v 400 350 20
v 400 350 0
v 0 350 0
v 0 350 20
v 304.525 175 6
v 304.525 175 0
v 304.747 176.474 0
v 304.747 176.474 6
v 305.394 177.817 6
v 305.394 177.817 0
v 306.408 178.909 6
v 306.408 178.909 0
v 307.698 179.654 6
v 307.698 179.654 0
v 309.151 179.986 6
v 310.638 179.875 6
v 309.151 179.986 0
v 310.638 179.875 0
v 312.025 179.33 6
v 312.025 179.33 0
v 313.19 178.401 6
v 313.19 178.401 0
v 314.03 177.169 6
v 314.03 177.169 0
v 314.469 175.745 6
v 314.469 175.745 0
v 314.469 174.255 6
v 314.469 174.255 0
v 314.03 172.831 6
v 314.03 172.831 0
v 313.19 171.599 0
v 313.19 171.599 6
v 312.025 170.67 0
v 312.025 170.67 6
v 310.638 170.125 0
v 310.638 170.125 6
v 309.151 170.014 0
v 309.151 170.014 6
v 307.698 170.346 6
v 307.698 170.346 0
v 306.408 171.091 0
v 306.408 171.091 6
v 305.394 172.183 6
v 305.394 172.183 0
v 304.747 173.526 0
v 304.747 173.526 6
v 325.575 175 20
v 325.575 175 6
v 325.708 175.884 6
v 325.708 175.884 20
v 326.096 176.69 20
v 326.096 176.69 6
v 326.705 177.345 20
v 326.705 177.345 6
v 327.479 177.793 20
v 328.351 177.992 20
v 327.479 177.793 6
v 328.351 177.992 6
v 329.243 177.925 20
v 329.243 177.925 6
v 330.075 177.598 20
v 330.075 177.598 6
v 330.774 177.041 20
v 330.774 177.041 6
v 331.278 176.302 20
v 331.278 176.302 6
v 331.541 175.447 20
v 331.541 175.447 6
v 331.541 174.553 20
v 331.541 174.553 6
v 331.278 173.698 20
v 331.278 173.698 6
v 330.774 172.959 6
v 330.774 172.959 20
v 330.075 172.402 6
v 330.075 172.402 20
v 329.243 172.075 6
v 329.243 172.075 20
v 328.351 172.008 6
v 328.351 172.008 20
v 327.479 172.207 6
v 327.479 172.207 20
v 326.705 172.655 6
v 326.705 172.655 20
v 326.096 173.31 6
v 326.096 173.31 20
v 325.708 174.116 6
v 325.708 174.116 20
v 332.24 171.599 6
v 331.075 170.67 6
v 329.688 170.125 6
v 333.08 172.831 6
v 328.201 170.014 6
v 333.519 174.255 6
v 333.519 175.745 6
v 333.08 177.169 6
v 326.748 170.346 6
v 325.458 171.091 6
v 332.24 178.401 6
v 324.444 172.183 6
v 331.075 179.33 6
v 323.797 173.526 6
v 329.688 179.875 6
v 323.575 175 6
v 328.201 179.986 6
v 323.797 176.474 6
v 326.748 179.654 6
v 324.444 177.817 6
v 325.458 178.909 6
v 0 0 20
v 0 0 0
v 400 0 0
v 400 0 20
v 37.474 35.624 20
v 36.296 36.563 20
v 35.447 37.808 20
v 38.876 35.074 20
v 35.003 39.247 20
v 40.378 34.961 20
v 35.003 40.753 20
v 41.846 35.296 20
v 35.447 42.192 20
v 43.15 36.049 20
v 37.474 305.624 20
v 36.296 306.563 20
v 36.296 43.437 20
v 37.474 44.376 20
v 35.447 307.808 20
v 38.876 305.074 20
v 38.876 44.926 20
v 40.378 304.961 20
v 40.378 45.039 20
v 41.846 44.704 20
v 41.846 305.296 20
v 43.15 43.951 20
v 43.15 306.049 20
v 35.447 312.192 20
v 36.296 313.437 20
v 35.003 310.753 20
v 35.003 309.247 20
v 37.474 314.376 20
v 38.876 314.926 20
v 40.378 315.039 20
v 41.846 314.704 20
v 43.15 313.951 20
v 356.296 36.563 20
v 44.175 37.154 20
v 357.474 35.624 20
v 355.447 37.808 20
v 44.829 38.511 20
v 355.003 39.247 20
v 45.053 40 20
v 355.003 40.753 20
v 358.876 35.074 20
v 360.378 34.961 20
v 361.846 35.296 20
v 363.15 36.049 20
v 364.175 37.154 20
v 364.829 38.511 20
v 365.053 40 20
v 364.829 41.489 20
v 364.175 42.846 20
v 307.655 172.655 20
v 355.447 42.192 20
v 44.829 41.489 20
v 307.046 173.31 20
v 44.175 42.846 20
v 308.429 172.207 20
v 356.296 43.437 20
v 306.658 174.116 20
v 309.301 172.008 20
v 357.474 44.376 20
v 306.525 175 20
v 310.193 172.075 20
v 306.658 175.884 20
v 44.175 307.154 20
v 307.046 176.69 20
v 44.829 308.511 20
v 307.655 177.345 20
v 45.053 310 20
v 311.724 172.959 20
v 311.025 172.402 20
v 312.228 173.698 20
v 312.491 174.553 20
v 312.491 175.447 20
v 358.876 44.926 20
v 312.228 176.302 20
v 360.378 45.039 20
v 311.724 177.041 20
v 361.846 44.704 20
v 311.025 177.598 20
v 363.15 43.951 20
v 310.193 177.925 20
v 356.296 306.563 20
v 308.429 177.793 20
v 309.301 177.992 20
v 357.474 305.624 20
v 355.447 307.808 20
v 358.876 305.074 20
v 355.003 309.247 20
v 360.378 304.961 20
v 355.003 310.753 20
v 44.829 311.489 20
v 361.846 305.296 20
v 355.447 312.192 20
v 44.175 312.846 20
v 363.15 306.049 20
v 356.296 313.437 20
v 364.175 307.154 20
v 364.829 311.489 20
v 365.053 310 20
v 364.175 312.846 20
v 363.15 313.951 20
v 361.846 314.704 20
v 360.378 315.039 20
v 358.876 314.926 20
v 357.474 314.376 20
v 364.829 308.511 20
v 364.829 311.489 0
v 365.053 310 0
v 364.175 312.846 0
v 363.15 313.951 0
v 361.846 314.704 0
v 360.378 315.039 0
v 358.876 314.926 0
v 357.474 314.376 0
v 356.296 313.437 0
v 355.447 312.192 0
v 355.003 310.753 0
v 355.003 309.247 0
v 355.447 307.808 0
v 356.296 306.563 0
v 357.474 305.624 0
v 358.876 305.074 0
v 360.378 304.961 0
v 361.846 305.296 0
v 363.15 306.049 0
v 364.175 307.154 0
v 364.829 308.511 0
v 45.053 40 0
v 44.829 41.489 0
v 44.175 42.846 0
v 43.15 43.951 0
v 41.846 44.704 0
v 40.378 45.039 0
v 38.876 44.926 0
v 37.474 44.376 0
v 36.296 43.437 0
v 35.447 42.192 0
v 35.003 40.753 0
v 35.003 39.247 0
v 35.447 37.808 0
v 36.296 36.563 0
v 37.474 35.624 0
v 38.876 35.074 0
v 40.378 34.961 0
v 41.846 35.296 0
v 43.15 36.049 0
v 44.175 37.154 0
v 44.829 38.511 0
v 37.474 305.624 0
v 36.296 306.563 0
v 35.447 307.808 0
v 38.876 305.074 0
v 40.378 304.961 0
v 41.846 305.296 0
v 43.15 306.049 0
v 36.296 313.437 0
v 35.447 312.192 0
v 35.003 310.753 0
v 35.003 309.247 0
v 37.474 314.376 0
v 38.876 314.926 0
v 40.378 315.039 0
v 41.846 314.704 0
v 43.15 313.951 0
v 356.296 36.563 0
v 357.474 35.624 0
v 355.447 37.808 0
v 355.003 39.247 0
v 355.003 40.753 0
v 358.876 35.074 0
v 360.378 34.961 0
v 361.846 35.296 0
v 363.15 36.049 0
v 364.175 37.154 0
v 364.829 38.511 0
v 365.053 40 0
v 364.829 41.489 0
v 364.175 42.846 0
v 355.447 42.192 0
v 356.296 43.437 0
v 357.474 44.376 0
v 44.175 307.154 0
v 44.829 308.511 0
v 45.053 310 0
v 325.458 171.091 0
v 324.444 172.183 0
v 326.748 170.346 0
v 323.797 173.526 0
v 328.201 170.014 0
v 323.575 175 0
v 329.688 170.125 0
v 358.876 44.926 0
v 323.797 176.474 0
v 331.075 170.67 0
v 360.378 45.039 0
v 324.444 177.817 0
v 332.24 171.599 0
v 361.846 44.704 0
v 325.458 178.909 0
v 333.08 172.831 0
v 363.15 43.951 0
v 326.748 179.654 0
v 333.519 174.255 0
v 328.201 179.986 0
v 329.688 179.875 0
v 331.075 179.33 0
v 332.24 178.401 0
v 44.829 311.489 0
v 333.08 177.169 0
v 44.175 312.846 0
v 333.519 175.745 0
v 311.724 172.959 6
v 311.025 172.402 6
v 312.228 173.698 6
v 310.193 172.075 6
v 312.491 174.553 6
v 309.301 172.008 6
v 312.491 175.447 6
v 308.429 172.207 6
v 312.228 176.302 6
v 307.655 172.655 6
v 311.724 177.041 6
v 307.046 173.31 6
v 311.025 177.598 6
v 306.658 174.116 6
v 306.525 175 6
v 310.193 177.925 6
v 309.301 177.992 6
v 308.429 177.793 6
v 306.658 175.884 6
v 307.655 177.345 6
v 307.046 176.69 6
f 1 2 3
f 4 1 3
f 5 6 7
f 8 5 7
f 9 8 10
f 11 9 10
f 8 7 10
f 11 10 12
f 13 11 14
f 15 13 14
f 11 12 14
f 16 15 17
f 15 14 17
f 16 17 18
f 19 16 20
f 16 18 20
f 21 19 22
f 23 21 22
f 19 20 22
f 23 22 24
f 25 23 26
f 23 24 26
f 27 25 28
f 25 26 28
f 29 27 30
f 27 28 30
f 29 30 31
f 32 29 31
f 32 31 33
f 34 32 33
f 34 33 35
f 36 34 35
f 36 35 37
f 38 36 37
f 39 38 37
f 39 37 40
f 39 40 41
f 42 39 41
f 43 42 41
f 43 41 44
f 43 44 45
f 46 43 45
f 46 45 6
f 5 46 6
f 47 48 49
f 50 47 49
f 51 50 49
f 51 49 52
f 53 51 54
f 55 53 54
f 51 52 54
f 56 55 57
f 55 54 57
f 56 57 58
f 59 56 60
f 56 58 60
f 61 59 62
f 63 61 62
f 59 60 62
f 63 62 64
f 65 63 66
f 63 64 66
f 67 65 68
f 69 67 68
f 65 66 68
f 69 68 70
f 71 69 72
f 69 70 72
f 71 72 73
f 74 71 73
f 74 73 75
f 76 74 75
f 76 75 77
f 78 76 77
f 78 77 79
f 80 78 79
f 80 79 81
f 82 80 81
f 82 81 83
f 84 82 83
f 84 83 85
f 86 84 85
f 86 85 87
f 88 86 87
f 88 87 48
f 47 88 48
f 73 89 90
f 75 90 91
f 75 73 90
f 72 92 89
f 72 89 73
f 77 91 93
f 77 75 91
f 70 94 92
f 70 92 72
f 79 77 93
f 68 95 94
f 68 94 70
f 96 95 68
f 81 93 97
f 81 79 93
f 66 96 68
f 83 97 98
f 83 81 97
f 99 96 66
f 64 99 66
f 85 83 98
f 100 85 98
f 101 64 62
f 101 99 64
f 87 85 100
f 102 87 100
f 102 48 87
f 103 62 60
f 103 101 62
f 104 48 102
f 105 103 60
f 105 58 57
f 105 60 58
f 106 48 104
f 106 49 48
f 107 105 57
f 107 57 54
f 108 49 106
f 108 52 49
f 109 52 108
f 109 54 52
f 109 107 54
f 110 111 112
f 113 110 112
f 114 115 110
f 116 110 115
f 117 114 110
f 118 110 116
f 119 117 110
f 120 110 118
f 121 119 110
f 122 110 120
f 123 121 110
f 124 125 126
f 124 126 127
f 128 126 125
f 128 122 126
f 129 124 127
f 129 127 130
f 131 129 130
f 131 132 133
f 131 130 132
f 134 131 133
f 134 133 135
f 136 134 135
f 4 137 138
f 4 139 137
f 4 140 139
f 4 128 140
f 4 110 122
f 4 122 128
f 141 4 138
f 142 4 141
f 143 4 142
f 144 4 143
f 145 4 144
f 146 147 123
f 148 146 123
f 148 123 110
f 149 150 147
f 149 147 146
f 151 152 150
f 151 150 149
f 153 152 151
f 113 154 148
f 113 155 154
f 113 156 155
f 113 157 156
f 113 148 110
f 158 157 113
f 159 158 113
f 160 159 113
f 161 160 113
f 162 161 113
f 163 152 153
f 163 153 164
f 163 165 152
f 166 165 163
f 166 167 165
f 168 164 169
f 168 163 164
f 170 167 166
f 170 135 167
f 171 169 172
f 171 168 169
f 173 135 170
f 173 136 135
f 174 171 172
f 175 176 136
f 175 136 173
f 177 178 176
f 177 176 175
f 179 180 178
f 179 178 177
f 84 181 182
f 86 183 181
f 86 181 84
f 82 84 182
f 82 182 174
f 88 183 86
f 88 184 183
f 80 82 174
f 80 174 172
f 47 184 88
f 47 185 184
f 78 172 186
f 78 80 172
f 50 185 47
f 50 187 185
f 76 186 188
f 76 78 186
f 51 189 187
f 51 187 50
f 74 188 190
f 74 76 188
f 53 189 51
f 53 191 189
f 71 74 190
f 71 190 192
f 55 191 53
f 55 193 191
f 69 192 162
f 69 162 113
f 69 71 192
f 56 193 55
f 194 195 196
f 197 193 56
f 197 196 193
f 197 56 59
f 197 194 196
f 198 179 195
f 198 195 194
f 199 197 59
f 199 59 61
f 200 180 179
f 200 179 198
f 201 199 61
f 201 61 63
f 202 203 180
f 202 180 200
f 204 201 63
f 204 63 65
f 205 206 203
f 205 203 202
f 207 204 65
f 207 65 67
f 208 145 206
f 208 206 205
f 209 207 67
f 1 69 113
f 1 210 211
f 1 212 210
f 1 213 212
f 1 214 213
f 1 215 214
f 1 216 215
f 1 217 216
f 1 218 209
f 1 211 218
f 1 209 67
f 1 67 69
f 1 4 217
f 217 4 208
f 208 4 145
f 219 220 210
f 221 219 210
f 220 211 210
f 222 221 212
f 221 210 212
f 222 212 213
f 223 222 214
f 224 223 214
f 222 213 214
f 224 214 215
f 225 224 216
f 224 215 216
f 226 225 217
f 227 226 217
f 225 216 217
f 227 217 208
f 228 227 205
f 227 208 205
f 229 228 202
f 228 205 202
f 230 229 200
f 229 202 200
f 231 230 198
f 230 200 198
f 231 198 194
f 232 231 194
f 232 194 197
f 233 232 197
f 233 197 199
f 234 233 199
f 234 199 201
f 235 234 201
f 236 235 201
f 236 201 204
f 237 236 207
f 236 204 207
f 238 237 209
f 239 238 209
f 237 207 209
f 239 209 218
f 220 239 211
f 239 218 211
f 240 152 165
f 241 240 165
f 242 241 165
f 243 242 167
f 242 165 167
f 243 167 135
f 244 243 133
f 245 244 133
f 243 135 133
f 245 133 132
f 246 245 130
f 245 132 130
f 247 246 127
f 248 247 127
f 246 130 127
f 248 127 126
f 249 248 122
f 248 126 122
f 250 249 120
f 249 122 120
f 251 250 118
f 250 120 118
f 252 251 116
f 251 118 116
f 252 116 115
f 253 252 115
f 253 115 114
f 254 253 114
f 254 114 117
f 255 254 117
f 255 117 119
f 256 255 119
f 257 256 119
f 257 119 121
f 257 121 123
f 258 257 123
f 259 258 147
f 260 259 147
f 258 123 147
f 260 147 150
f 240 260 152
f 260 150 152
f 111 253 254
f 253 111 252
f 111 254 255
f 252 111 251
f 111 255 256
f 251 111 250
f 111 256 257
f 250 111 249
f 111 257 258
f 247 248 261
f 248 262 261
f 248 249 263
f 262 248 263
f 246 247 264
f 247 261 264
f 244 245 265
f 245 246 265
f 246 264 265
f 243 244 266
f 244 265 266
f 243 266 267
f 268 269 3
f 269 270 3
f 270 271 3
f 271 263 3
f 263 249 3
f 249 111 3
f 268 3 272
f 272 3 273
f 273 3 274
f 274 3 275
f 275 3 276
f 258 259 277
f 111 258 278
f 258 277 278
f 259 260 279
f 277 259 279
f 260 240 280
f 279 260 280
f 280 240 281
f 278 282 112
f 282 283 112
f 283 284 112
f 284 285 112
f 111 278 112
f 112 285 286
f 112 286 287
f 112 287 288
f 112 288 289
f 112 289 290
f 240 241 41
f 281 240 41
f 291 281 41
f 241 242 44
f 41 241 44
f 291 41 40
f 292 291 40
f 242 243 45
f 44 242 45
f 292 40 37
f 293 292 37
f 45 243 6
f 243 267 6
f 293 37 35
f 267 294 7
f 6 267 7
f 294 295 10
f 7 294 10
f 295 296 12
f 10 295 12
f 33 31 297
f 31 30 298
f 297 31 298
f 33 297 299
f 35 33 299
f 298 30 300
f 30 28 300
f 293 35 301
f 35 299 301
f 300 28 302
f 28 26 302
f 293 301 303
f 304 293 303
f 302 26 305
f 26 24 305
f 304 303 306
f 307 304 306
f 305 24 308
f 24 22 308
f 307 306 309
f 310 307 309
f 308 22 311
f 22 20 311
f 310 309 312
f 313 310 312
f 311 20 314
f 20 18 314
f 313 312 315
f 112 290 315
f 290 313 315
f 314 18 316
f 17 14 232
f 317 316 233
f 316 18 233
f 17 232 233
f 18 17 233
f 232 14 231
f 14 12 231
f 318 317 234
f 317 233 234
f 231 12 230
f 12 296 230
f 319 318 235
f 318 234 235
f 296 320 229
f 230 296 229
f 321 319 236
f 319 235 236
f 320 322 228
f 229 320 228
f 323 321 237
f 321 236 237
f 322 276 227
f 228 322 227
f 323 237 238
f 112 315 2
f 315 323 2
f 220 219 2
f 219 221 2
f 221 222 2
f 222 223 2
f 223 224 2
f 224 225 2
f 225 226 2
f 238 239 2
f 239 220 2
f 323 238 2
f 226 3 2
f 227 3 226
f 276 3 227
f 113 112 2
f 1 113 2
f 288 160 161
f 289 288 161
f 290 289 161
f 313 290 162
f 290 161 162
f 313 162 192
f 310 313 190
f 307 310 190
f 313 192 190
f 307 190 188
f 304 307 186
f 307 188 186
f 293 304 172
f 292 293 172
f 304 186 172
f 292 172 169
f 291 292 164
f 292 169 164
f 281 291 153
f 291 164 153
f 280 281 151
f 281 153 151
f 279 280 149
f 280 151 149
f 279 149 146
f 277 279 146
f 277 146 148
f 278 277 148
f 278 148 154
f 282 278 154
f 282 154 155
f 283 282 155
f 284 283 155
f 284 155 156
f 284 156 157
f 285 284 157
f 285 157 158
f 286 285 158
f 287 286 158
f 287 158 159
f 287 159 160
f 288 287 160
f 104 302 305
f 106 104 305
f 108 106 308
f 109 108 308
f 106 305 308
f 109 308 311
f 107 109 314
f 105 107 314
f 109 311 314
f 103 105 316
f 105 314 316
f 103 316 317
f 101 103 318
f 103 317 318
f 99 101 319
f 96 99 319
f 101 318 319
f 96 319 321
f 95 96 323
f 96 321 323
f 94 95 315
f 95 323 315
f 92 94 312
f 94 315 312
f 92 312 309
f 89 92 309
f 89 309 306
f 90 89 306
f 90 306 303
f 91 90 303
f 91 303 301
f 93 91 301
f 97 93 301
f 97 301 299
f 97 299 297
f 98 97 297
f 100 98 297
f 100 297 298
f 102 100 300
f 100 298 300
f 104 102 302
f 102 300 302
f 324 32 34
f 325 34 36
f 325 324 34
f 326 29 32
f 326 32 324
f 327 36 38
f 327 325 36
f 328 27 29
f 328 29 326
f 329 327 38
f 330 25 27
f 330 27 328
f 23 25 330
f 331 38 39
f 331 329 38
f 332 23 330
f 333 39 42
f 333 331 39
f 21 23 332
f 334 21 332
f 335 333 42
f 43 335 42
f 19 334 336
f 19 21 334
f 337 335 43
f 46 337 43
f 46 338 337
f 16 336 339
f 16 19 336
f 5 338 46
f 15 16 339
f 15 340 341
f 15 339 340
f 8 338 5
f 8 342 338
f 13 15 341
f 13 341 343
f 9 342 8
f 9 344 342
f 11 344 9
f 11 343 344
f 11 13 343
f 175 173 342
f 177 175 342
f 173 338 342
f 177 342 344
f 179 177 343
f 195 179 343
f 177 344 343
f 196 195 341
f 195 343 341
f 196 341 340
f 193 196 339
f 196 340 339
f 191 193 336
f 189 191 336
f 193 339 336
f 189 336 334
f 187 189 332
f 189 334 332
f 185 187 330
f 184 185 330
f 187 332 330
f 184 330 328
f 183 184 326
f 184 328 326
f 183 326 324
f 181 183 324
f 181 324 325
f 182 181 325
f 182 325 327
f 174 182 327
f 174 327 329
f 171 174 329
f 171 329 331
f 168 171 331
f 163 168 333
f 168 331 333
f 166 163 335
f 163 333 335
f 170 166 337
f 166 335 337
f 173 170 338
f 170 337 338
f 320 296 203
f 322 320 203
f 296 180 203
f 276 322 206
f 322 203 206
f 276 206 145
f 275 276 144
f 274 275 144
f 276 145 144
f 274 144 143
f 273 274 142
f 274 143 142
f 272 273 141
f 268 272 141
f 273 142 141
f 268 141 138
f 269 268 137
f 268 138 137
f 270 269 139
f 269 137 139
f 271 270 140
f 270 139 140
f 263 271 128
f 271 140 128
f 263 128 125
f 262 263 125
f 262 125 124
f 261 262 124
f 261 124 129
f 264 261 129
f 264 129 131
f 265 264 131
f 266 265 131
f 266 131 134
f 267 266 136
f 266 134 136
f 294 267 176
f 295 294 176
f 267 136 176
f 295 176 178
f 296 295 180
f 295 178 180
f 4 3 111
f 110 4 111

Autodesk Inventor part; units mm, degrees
ref_plane "YZ Plane" through (0, 0, 0) normal (1, 0, 0) x (0, 1, 0)
ref_plane "XZ Plane" through (0, 0, 0) normal (0, 1, 0) x (-1, 0, 0)
ref_plane "XY Plane" through (0, 0, 0) normal (0, 0, 1) x (1, 0, 0)
sketch "Sketch1" plane through (0, 0, 0) normal (0, 0, 1) x (1, 0, 0)
  line L0 (0, 0) -> (400, 0)
  line L1 (400, 0) -> (400, 350)
  line L2 (400, 350) -> (0, 350)
  line L3 (0, 350) -> (0, 0)
  dimension "d0" = 400
  dimension "d1" = 350
extrude "Extrusion1" add sketch "Sketch1" along normal blind 20
sketch "Sketch7" plane through (0, 0, 20) normal (0, 0, 1) x (1, 0, 0)
  circle A0 centre (40, 40) radius 5.053
  line L0 (400, 350) -> (0, 350) construction
  line L1 (400, 0) -> (400, 350) construction
  line L2 (0, 0) -> (400, 0) construction
  line L3 (0, 350) -> (0, 0) construction
  line L4 (200, 350) -> (200, 0) construction
  line L5 (0, 175) -> (400, 175) construction
  circle A1 centre (40, 310) radius 5.053
  circle A2 centre (360, 40) radius 5.053
  circle A3 centre (360, 310) radius 5.053
extrude "Extrusion7" cut sketch "Sketch7" against normal blind 20
sketch "Sketch8" plane through (0, 0, 0) normal (0, 0, -1) x (-1, 0, 0)
  circle A0 centre (-309.525, 175) radius 3
  circle A1 centre (-328.575, 175) radius 3
  point P0 (0, 0)
extrude "Extrusion8" cut sketch "Sketch8" against normal blind 20
sketch "Sketch9" plane through (0, 0, 0) normal (0, 0, -1) x (-1, 0, 0)
  circle A0 centre (-309.525, 175) radius 3 construction
  circle A1 centre (-328.575, 175) radius 3 construction
  circle A2 centre (-309.525, 175) radius 3 projected
  circle A3 centre (-309.525, 175) radius 5
  circle A4 centre (-328.575, 175) radius 3 projected
  circle A5 centre (-328.575, 175) radius 5
  point P0 (0, 0)
  dimension "d24" = 10
  dimension "d25" = 10
extrude "Extrusion9" cut sketch "Sketch9" against normal blind 6
equation "\"d0\" = maxl"
equation "\"d1\" = maxw"
equation "\"d2\" = platft"
equation "\"d20\" = platft"
equation "\"d22\" = platft"
equation "\"d24\" = bhd"
equation "\"d25\" = bhd"
equation "\"d26\" = bhh"
equation "\"dias\" = 8.8"
equation "\"stra1\" = 9.5"
equation "\"diab2\" = 6"
equation "\"stra\" = 25"
equation "\"db1\" = 6"
equation "\"ds1\" = 5.8"
equation "\"ds2\" = 1.6"
equation "\"ang\" = 120deg"
equation "\"db2\" = 3"
equation "\"diab3\" = 7"
equation "\"diab4\" = 3"
equation "\"dias1\" = 13.4375"
equation "\"dias3\" = 2"
equation "\"dias4\" = 4"
equation "\"t1\" = 3"
equation "\"t2\" = 3"
equation "\"t3\" = 6"
equation "\"t4\" = 6"
equation "\"t5\" = 3"
equation "\"diab1\" = 19"
equation "\"afw\" = 0.2"
equation "\"maxw\" = 350"
equation "\"lcsd\" = 19.05"
equation "\"lcwd1\" = 25"
equation "\"lch1\" = 39"
equation "\"lcwd2\" = 34"
equation "\"lcwd3\" = 43"
equation "\"dia1\" = 6"
equation "\"td\" = 18"
equation "\"bhh\" = 6"
equation "\"bhd\" = 10"
equation "\"spacert\" = 2"
equation "\"sw\" = 25"
equation "\"sh\" = 31"
equation "\"platft\" = 20"
equation "\"pvct\" = 5"
equation "\"tankl\" = 379"
equation "\"dia4\" = 11"
equation "\"dia3\" = 8"
equation "\"play\" = 9"
equation "\"holeh\" = 26"
equation "\"surroundt\" = 5"
equation "\"slack\" = 0.5"
equation "\"play2\" = 3"
equation "\"maxl\" = 400"
equation "\"diaoverflow\" = 25"
equation "\"diacucl\" = 32"
equation "\"diawater\" = 25"
equation "\"diaph\" = 32"
equation "\"diaair\" = 32"
equation "\"diasurroundhole\" = 42"
equation "\"diagrate\" = 12"
equation "\"gratespacing\" = 12.02082"
equation "\"sidedist\" = 13.9375"
equation "\"bottomdist\" = 9.6355"
equation "\"diahcl\" = 32"
equation "\"bracketwtop\" = 6"
equation "\"bracketwbottom\" = 6"
equation "\"nett\" = 1"
equation "\"nethole\" = 16"
equation "\"nettop\" = 7"
equation "\"netside\" = 3.5"
equation "\"netholespacing\" = 2"
equation "\"diaetape\" = 32"
properties part number "platform_top" material "PVC-Piping"
